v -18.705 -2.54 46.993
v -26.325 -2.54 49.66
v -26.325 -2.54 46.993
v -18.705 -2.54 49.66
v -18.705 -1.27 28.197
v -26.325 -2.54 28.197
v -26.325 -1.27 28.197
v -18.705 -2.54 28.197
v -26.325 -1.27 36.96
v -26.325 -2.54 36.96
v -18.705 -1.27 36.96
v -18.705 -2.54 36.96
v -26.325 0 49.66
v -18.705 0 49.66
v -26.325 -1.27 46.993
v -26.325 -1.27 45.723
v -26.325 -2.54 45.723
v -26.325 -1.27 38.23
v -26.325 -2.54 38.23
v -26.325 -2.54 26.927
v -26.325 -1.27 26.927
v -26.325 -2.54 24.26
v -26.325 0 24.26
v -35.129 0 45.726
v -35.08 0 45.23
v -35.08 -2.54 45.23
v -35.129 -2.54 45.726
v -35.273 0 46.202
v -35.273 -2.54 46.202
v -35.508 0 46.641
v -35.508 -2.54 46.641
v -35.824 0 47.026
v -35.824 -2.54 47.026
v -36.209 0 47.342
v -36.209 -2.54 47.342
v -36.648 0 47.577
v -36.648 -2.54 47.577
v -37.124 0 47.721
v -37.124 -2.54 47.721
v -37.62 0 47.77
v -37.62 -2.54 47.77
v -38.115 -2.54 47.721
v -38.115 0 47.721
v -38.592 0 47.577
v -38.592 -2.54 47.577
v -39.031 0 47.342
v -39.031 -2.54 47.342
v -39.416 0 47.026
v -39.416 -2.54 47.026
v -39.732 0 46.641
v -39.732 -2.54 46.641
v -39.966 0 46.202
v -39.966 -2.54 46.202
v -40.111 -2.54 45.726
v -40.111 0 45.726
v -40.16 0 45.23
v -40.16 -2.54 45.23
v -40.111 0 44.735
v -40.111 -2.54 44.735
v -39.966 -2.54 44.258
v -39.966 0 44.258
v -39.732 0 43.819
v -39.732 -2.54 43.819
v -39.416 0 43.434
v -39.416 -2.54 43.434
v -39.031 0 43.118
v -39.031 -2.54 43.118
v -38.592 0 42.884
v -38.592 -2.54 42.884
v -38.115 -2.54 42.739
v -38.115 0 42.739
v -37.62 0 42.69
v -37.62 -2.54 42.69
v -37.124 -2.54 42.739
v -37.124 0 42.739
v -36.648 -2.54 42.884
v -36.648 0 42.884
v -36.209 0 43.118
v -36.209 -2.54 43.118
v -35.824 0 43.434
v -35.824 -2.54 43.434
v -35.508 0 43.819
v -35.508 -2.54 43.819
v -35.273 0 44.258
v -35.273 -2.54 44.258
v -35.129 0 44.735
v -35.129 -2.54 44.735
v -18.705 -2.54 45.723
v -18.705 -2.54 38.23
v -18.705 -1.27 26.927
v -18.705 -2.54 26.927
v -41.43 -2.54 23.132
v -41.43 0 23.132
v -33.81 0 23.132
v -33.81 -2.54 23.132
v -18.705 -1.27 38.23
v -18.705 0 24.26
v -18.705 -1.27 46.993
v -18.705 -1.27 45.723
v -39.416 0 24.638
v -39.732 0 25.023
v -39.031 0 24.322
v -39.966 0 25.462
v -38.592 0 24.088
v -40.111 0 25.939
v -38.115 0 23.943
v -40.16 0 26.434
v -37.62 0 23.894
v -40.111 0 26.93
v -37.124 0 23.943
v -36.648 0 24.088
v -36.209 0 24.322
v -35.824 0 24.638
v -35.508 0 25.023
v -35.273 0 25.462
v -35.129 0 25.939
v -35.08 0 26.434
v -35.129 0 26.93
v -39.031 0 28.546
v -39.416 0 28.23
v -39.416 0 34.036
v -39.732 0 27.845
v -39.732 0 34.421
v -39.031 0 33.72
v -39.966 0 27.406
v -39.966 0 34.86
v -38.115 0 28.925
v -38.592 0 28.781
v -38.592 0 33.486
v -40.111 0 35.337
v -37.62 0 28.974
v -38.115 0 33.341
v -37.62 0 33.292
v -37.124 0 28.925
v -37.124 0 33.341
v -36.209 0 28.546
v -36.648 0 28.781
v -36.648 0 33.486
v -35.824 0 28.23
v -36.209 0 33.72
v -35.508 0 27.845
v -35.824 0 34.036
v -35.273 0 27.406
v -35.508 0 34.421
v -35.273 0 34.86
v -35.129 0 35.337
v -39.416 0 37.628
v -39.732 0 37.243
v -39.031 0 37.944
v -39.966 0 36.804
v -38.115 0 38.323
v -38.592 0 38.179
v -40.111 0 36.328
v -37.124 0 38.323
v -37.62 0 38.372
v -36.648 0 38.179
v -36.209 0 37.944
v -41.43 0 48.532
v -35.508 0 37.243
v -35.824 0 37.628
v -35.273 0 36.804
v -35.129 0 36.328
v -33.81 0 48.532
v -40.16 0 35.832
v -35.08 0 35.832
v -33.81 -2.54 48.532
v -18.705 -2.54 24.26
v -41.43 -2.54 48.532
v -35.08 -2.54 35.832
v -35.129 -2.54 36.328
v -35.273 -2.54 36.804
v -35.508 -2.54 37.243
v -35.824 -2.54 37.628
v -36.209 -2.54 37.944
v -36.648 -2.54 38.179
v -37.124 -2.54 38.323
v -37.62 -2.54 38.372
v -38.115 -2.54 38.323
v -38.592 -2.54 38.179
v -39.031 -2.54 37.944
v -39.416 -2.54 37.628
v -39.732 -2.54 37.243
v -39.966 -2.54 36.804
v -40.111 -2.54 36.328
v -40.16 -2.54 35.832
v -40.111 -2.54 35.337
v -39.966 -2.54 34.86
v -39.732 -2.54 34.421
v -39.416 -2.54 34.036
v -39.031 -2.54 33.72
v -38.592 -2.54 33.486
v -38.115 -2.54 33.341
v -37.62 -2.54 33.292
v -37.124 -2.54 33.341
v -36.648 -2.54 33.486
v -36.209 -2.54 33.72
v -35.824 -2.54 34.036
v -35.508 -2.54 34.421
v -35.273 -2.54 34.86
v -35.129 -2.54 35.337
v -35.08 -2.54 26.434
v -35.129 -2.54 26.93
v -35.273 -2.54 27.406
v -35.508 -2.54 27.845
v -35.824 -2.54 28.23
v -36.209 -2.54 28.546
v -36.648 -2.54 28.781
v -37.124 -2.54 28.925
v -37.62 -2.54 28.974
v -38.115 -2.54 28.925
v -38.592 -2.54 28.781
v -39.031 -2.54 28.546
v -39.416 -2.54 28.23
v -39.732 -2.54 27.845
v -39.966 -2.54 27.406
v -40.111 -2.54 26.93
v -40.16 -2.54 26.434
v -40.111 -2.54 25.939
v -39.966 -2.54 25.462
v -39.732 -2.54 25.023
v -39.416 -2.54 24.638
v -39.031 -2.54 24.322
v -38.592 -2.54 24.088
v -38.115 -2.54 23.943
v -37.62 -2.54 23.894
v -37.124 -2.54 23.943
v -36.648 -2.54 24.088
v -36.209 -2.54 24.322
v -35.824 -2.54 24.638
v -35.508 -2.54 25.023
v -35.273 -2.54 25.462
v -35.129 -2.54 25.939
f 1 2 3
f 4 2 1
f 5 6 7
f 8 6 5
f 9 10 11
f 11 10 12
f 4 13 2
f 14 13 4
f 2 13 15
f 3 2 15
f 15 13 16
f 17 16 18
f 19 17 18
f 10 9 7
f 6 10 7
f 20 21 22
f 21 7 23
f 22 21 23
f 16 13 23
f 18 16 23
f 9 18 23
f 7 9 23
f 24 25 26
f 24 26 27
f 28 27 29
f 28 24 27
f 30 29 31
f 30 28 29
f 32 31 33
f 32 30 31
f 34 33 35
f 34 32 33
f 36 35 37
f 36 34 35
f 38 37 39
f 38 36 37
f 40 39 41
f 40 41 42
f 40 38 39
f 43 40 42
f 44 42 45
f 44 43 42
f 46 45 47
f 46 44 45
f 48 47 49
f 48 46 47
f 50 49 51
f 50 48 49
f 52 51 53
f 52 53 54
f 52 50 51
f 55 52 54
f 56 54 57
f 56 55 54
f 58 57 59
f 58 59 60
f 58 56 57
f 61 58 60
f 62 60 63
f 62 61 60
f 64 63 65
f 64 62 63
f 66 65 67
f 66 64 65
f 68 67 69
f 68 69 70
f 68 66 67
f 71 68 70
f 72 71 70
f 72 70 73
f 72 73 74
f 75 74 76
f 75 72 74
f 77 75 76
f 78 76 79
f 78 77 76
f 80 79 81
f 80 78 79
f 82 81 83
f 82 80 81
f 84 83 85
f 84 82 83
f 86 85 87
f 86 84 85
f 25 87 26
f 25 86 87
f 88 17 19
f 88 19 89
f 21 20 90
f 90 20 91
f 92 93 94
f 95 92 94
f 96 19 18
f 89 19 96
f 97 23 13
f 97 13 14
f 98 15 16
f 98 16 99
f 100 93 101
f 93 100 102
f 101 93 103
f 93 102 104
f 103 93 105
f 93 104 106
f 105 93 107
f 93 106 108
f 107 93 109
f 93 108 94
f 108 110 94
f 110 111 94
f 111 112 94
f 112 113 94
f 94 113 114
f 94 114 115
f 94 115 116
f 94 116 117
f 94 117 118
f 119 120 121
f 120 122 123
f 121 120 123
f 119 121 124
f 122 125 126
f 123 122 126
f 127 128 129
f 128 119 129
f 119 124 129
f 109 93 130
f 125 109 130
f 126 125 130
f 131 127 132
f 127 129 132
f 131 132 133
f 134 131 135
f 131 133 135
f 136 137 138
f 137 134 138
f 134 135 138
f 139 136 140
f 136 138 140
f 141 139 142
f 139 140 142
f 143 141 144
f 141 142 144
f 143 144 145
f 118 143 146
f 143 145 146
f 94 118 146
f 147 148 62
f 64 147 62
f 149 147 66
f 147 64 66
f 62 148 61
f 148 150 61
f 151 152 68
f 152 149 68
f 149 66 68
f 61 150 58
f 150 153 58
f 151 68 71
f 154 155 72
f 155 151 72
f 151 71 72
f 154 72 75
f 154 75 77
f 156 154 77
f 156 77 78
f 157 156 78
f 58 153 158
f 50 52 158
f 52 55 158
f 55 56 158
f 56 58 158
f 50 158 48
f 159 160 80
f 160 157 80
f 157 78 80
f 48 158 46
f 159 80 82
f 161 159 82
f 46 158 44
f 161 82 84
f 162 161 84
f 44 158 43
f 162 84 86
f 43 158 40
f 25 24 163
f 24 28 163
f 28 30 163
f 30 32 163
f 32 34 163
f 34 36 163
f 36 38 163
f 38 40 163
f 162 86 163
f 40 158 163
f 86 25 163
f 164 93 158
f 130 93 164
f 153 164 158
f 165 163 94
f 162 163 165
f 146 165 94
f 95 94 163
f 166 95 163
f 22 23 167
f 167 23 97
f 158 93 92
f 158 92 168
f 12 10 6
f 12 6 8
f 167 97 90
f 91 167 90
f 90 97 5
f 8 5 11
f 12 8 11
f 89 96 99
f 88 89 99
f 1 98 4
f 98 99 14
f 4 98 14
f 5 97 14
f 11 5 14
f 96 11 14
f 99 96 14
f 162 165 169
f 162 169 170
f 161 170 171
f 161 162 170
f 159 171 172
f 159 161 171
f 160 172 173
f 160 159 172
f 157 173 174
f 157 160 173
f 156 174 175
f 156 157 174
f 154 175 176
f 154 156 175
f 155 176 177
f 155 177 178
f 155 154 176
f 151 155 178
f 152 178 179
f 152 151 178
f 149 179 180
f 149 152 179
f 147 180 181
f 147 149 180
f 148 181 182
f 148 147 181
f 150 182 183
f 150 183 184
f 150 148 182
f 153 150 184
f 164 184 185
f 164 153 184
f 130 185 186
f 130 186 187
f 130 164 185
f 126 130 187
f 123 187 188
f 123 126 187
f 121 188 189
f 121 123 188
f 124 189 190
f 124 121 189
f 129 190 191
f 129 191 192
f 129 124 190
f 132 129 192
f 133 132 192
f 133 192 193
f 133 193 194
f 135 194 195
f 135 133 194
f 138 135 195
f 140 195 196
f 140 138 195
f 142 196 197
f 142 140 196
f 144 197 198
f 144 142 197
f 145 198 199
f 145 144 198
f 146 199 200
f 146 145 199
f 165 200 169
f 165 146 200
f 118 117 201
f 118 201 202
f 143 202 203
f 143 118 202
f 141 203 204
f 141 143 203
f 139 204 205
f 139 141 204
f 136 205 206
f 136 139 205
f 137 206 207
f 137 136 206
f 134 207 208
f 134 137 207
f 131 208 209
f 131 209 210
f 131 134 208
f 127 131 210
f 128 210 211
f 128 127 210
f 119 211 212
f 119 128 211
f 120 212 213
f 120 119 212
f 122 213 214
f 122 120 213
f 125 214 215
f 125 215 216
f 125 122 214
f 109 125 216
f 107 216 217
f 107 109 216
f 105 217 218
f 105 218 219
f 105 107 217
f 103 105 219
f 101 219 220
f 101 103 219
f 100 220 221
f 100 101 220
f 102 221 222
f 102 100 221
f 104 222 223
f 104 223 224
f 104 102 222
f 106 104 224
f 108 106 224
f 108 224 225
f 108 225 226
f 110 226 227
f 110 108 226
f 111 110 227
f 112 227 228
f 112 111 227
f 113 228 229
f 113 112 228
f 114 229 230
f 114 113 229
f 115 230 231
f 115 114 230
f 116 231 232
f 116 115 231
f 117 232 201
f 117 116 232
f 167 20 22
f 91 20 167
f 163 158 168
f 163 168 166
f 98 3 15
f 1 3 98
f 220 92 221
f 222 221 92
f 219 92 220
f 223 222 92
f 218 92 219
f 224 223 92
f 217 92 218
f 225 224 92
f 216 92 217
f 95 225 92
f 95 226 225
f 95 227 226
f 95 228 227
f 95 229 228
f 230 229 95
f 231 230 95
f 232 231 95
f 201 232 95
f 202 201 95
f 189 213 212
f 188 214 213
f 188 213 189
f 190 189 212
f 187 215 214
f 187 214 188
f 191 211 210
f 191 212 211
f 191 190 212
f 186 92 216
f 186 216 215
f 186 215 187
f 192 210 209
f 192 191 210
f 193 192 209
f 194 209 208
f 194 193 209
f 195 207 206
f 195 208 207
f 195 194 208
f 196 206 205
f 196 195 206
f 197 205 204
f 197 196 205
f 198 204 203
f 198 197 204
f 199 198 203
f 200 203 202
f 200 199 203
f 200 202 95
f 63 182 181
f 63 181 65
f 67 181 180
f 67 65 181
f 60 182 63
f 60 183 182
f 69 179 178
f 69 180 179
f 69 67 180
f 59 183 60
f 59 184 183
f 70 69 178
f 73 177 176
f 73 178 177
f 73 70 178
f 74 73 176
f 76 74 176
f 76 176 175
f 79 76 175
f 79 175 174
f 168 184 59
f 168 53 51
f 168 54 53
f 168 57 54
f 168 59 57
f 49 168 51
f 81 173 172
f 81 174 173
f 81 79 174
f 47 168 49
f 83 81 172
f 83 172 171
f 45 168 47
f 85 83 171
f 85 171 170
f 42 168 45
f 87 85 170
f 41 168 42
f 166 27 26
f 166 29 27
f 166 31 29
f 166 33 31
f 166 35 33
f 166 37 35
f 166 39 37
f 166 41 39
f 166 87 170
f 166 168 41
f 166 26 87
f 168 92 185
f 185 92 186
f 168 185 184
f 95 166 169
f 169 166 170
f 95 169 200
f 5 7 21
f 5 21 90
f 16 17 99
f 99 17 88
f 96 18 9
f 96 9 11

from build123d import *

# Parameters (mm, degrees)
F0_W     = 7.62
F0_H     = 25.4
F0_R     = 2.54
F1_DEPTH = 2.54
F2_W     = 7.62
F2_H     = 2.667
F2_H_2   = 8.128
F2_H_3   = 1.27
F3_DEPTH = 2.54
F4_W     = 7.62
F4_H     = 1.27
F5_DEPTH = 1.27
F6_DEPTH = 1.27
F7_DEPTH = 1.27


with BuildPart() as f1:
    # F0 (on Front) → F1 (new body)
    with BuildSketch(Plane.XZ):
        with Locations((-37.619725, 35.832207)):
            Rectangle(F0_W, F0_H)
        with Locations((-37.619725, 35.832207)):
            Circle(F0_R, mode=Mode.SUBTRACT)
        with Locations((-37.619725, 26.434207)):
            Circle(F0_R, mode=Mode.SUBTRACT)
        with Locations((-37.619725, 45.230207)):
            Circle(F0_R, mode=Mode.SUBTRACT)
    extrude(amount=F1_DEPTH)


with BuildPart() as f3:
    # F2 (on Front) → F3 (new body)
    with BuildSketch(Plane.XZ):
        with Locations((-22.514881, 48.326226)):
            Rectangle(F2_W, F2_H)
        with Locations((-22.514881, 41.658726)):
            Rectangle(F2_W, F2_H_2)
        with Locations((-22.514881, 46.357726)):
            Rectangle(F2_W, F2_H_3)
        with Locations((-22.514881, 36.959726)):
            Rectangle(F2_W, F2_H_3)
        with Locations((-22.514881, 32.260726)):
            Rectangle(F2_W, F2_H_2)
        with Locations((-22.514881, 27.561726)):
            Rectangle(F2_W, F2_H_3)
        with Locations((-22.514881, 25.593226)):
            Rectangle(F2_W, F2_H)
    extrude(amount=F3_DEPTH)

    # F4 (on face) → F5 (cut)
    with BuildSketch(Plane.XZ.offset(2.54)):
        with Locations((-22.514881, 46.357726)):
            Rectangle(F4_W, F4_H)
    extrude(amount=-F5_DEPTH, mode=Mode.SUBTRACT)

    # F4 (on face) → F6 (cut)
    with BuildSketch(Plane.XZ.offset(2.54)):
        with Locations((-22.514881, 37.594726)):
            Rectangle(F4_W, F4_H)
    extrude(amount=-F6_DEPTH, mode=Mode.SUBTRACT)

    # F4 (on face) → F7 (cut)
    with BuildSketch(Plane.XZ.offset(2.54)):
        with Locations((-22.514881, 27.561726)):
            Rectangle(F4_W, F4_H)
    extrude(amount=-F7_DEPTH, mode=Mode.SUBTRACT)


solid = Compound([f1.part, f3.part])
